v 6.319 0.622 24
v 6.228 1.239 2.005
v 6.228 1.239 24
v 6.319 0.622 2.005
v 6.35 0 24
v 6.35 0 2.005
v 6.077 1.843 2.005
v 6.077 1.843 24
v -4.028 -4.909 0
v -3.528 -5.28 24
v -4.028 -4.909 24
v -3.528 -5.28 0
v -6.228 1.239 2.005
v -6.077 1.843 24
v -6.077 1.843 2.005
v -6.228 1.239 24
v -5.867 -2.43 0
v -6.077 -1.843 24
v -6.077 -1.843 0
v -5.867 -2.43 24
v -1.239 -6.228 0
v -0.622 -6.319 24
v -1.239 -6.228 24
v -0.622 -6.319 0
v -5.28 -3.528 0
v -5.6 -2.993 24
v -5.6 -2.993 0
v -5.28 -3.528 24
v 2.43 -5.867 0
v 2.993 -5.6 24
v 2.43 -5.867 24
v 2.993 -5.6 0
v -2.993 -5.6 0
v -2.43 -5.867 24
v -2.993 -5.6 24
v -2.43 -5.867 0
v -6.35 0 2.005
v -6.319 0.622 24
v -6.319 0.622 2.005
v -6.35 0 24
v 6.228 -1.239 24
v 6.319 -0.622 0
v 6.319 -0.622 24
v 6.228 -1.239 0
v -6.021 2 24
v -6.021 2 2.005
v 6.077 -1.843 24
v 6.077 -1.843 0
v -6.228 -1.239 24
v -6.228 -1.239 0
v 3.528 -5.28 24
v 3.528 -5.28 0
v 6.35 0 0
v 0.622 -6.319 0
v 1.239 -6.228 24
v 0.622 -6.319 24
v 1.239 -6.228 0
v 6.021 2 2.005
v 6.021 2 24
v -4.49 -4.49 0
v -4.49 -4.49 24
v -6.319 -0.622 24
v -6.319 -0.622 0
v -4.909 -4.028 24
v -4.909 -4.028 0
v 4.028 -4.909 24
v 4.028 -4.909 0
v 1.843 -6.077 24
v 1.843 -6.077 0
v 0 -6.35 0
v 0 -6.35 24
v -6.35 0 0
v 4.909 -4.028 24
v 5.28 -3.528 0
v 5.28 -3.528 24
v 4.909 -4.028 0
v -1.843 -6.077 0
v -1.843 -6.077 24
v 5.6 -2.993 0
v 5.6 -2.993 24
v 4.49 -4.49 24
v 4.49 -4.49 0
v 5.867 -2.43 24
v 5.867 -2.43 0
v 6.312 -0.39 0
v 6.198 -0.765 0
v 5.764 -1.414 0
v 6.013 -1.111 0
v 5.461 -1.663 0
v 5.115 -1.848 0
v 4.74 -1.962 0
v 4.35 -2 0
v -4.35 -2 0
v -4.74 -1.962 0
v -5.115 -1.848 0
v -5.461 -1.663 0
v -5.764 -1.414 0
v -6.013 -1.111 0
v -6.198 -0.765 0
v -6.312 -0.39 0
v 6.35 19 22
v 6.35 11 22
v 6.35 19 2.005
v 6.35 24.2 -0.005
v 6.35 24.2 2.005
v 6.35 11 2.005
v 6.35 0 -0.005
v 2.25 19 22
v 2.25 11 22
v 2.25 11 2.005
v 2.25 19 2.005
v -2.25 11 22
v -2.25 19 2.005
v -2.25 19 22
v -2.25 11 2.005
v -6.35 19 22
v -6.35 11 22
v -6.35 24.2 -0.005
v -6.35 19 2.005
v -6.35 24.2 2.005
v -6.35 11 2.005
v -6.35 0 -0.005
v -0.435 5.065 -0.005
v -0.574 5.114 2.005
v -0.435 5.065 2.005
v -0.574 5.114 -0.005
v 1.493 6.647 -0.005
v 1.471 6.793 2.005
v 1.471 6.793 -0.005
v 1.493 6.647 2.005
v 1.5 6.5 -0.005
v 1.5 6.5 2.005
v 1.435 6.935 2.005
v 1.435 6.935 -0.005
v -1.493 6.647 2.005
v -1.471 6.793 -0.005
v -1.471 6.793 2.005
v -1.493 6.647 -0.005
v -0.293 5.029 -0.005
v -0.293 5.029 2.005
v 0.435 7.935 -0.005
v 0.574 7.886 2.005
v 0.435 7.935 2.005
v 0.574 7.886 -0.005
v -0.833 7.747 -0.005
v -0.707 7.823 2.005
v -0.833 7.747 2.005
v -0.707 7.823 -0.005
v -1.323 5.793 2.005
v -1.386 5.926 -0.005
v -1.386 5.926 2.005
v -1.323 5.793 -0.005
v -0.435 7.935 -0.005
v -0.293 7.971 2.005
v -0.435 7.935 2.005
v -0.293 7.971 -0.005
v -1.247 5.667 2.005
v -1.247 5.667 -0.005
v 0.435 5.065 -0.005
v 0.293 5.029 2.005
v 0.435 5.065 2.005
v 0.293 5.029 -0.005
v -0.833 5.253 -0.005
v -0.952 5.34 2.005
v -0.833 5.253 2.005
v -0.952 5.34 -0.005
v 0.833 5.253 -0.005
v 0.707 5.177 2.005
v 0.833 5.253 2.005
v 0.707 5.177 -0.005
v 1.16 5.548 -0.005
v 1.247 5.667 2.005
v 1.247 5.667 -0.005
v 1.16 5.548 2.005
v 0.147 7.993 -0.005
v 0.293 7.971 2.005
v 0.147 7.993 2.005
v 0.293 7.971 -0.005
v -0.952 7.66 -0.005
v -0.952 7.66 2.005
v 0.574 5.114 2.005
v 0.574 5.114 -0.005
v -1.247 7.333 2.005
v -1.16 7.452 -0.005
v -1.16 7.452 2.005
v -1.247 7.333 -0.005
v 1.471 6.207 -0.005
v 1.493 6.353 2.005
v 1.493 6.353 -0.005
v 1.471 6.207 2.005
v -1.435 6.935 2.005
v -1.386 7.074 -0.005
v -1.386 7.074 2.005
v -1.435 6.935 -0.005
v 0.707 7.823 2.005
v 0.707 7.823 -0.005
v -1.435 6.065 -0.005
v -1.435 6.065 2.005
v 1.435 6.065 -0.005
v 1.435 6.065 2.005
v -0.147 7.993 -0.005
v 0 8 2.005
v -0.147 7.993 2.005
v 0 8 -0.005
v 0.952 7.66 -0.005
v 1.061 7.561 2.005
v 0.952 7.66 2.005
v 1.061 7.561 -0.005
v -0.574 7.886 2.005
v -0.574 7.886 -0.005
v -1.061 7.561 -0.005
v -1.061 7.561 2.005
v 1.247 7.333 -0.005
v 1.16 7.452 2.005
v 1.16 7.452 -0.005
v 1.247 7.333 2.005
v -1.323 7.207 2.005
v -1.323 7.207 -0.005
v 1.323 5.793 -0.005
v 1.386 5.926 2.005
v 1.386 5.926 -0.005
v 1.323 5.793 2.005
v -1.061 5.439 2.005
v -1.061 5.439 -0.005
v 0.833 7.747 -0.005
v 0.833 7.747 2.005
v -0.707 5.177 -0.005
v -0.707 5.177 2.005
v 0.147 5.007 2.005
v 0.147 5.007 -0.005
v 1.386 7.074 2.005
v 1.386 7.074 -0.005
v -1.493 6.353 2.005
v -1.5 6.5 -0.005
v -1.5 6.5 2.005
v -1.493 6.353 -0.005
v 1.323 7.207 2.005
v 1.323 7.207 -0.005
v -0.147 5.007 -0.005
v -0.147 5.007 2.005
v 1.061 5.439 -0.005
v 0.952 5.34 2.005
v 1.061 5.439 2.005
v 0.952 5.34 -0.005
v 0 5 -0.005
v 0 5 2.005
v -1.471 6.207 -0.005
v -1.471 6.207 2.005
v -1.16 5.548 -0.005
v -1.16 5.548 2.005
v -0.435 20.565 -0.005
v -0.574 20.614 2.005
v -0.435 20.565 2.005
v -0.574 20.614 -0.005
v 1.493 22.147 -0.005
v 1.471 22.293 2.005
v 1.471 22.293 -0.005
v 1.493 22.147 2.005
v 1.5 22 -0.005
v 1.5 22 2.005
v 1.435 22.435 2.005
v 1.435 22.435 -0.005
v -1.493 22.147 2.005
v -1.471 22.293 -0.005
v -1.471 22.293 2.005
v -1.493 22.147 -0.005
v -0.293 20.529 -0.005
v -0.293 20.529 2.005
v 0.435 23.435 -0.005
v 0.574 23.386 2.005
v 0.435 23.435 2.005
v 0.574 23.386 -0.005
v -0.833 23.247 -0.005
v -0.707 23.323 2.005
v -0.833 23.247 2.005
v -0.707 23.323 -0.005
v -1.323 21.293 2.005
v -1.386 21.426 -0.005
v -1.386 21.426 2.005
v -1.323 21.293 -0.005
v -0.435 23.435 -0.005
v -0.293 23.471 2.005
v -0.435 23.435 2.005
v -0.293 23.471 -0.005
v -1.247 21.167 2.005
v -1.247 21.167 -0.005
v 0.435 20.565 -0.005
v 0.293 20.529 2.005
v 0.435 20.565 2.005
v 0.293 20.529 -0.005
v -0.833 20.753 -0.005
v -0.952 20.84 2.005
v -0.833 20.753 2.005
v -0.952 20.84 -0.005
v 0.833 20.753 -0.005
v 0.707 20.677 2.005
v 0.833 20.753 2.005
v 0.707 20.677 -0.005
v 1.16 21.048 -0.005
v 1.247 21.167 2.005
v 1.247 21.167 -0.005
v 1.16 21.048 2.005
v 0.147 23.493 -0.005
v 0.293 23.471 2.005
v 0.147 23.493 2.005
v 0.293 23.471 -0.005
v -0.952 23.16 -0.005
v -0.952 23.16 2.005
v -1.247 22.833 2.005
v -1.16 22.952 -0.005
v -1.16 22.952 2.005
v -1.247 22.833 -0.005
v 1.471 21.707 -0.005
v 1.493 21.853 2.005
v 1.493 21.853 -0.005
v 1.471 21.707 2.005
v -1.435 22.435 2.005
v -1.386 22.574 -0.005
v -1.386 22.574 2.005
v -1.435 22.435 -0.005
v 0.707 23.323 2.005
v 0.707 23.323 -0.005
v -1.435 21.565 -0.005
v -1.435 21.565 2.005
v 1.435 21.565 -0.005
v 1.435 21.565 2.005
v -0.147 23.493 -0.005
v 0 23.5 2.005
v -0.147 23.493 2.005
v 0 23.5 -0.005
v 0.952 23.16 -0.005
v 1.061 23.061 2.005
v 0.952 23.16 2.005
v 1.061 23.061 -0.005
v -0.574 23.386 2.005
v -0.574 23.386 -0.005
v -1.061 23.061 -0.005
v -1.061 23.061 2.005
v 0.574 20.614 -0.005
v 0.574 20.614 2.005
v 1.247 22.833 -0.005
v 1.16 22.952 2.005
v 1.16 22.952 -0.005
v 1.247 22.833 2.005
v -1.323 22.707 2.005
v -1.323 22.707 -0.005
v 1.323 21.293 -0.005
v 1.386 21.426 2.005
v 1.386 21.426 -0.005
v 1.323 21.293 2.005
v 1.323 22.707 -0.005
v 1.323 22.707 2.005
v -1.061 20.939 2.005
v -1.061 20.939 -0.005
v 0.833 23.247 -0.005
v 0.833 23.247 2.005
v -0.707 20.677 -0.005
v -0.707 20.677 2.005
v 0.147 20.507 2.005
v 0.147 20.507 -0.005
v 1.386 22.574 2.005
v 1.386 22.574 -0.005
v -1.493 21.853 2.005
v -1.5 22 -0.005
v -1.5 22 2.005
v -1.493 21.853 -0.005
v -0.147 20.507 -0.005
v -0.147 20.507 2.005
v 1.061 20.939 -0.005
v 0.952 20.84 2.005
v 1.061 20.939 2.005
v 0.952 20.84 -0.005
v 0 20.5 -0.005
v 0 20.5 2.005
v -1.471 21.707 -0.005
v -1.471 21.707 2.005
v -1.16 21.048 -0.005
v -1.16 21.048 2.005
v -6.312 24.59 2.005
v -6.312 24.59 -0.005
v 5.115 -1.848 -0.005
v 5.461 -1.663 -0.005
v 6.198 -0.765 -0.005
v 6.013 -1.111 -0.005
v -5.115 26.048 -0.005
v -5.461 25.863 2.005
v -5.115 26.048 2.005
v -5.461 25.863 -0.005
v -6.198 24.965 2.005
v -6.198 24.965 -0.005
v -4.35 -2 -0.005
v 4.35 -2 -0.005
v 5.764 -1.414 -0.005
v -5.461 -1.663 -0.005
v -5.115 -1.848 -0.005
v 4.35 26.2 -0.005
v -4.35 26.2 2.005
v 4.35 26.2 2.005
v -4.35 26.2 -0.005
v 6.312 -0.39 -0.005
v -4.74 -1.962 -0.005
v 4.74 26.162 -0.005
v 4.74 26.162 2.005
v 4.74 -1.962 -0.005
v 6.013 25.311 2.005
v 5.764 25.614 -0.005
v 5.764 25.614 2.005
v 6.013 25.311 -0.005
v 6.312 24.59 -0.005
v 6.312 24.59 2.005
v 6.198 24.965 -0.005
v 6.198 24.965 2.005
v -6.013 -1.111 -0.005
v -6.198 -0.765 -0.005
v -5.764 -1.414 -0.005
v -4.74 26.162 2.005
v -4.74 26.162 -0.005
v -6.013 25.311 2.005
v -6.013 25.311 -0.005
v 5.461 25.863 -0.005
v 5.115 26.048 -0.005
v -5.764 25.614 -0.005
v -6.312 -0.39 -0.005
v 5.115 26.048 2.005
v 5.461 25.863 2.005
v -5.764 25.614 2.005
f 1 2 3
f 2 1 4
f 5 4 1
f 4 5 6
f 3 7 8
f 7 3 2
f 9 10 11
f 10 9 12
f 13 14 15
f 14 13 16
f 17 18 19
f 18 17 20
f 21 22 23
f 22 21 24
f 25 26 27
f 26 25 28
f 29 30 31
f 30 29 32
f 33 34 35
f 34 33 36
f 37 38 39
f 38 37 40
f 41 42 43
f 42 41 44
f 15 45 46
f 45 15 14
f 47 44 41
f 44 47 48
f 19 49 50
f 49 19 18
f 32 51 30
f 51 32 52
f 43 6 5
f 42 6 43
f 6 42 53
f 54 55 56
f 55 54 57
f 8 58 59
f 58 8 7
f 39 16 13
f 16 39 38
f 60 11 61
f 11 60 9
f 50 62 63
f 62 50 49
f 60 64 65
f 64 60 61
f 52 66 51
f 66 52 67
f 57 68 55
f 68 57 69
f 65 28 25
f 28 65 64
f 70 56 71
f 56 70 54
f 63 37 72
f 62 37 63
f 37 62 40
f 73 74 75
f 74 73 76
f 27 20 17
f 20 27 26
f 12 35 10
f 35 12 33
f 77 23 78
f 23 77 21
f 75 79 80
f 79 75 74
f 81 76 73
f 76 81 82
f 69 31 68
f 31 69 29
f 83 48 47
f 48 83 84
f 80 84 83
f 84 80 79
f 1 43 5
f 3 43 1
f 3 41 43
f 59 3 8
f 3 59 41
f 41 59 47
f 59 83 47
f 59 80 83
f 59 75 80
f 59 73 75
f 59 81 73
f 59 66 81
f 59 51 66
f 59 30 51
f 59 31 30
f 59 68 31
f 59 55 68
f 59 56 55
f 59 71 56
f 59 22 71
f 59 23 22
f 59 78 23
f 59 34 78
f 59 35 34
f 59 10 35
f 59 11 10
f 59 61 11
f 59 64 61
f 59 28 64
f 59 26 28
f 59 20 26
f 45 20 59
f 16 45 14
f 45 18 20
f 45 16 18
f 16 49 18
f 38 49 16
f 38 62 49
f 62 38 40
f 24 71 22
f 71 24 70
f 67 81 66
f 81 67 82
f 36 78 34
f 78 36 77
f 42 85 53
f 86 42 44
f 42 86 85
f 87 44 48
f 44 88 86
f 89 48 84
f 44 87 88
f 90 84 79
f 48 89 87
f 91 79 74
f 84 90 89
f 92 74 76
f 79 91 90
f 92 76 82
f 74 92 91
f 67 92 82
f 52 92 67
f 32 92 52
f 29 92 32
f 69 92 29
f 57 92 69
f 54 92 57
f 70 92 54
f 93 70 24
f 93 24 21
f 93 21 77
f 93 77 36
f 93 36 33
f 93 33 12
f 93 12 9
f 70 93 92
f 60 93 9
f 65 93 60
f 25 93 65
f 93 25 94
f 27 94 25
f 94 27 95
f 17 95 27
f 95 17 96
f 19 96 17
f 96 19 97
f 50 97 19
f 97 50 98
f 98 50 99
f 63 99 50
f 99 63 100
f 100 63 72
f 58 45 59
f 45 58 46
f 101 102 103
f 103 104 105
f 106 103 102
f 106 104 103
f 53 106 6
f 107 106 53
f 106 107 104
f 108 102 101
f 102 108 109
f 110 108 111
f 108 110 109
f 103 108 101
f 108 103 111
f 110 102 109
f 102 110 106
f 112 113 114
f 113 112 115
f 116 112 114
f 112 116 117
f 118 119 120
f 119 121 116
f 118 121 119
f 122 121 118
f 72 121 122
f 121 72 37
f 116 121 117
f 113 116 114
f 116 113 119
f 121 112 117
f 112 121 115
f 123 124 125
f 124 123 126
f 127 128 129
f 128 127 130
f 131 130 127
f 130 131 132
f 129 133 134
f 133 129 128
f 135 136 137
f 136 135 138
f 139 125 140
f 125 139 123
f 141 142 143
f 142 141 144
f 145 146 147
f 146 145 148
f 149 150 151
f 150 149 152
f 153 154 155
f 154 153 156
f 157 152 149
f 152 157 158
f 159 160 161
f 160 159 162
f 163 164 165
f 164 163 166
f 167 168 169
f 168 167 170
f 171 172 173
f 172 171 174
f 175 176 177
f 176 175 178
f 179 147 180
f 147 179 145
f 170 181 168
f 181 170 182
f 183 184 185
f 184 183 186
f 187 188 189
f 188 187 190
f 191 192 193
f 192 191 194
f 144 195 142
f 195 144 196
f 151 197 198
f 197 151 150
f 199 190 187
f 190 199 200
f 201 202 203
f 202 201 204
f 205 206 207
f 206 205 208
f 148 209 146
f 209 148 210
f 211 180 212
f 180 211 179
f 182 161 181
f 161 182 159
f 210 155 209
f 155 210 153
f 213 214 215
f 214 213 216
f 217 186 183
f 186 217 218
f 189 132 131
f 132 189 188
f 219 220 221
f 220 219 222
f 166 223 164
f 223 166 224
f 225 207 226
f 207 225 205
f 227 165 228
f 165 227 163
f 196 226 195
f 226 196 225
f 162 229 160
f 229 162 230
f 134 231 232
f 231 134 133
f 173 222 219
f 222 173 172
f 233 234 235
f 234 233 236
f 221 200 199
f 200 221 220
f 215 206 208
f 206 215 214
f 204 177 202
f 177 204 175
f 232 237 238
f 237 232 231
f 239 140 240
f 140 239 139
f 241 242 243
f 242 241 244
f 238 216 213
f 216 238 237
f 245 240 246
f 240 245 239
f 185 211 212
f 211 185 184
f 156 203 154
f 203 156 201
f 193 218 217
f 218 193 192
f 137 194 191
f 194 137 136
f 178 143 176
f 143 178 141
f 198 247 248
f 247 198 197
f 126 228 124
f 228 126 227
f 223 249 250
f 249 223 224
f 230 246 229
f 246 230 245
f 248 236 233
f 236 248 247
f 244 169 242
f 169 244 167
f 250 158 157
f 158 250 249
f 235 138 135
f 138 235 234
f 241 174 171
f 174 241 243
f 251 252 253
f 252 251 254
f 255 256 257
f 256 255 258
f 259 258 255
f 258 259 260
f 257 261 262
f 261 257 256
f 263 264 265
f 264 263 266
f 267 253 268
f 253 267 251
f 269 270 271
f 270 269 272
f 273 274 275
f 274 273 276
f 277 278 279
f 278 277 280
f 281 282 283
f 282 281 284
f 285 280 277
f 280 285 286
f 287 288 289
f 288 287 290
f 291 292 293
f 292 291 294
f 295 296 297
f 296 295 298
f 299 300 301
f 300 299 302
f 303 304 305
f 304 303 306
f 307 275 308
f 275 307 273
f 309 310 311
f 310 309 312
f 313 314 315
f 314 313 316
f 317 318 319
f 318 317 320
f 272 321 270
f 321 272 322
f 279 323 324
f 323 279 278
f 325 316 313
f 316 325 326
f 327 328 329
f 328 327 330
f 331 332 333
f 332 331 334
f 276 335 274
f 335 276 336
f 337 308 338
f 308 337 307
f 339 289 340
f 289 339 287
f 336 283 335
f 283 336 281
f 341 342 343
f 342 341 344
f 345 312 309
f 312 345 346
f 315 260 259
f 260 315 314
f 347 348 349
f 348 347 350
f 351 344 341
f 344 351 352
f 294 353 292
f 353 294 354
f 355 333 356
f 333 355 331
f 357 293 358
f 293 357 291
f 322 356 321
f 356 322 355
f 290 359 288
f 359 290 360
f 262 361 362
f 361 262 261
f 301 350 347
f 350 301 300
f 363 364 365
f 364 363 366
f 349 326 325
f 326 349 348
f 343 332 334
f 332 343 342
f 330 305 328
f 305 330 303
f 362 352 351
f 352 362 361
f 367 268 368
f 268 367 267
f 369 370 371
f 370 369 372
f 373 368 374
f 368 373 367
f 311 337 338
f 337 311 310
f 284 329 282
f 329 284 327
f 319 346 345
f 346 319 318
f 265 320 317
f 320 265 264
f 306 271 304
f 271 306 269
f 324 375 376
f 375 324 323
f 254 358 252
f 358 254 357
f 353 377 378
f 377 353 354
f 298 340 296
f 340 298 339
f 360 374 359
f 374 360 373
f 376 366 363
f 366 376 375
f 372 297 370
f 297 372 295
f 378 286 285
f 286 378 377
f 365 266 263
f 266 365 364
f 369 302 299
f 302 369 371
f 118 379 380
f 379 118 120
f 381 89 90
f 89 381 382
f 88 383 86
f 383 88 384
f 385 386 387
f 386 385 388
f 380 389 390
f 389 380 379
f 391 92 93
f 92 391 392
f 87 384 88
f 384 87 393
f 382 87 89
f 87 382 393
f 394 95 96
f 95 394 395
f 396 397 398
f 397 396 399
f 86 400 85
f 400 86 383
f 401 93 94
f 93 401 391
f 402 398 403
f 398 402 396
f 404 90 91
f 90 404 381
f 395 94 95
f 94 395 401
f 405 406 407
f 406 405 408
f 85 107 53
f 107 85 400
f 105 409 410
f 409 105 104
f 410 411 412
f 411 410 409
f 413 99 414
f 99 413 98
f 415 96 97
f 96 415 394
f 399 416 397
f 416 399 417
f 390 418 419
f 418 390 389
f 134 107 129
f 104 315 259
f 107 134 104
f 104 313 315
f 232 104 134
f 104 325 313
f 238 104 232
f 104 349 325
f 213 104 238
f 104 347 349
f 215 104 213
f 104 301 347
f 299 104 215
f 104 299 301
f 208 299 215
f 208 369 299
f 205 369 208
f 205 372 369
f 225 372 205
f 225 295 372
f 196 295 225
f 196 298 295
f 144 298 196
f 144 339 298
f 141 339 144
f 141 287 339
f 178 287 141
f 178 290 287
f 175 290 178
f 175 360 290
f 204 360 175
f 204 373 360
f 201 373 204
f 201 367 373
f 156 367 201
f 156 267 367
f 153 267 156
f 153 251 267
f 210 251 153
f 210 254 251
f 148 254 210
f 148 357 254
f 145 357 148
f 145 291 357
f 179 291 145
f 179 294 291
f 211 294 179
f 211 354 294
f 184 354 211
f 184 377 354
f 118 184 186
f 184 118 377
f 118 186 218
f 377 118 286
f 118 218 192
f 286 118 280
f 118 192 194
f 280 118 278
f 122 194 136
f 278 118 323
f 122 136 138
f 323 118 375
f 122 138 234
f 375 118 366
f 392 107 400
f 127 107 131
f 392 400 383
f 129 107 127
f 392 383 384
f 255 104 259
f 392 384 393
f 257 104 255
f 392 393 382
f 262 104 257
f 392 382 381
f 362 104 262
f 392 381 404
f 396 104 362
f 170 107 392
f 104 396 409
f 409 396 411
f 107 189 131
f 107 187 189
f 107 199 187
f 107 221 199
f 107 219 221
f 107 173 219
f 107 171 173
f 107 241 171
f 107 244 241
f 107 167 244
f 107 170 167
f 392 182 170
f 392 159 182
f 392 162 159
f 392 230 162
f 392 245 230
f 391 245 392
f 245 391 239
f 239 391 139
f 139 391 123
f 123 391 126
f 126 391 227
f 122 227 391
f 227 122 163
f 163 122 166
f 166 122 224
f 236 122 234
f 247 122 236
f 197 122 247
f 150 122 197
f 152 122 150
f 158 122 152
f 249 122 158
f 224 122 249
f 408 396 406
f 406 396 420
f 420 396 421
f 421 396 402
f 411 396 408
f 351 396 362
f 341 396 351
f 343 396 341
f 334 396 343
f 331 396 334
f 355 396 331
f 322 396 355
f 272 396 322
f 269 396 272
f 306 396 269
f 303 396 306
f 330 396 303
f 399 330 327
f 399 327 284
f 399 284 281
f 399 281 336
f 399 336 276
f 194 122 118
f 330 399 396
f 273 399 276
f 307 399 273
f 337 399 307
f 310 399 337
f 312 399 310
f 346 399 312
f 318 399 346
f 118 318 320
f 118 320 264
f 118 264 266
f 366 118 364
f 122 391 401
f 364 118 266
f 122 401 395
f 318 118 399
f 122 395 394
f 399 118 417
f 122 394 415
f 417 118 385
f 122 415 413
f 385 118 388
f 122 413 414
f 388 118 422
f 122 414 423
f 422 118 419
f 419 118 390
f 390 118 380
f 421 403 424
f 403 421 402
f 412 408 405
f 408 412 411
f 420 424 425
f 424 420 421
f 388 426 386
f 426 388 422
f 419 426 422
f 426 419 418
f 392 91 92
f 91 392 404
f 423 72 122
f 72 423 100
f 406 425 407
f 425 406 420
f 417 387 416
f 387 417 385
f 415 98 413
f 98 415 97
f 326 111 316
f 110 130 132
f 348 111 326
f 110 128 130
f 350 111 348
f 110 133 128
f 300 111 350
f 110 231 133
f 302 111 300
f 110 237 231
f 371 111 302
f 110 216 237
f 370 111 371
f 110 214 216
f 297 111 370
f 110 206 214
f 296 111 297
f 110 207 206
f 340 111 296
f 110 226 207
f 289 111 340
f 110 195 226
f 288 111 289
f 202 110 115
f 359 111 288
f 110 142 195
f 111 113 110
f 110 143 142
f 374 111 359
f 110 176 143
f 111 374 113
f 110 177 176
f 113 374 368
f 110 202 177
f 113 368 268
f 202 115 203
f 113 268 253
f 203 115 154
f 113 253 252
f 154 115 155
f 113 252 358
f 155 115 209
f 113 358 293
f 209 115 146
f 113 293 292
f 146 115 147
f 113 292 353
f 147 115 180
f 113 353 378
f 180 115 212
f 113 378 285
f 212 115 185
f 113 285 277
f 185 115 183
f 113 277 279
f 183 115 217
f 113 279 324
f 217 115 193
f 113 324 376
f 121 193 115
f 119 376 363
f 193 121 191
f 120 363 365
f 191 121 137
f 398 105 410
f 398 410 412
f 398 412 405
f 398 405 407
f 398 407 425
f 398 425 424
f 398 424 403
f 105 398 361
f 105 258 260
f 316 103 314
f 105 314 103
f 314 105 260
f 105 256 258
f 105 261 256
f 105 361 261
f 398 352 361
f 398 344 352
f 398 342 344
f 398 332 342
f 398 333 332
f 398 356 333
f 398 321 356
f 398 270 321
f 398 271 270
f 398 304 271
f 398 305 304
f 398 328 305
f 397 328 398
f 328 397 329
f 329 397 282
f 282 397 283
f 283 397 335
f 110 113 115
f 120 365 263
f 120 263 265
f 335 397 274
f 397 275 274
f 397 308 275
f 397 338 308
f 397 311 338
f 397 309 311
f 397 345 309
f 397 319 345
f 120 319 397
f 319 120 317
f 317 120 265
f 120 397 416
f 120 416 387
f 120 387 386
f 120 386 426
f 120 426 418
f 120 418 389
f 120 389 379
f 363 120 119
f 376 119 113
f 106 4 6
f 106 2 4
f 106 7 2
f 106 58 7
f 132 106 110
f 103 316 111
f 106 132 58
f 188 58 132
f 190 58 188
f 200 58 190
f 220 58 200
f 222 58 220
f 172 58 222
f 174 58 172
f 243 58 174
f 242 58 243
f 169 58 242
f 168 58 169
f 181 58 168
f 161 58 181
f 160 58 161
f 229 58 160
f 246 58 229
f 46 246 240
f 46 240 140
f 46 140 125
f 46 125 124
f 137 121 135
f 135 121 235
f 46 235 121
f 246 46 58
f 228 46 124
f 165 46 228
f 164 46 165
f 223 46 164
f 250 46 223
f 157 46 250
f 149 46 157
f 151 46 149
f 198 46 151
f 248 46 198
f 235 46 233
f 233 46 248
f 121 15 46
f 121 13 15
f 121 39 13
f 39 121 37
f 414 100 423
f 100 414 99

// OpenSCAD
// file: shared/cleaning_wipe_holder.scad
// Module: Basic cleaning wipe holder
// Repo: https://github.com/hornc/VHS-cleaning
// Author: hornc, 2026
// Version: v0.1
// License: CC BY-SA 4.0

cleaning_wipe_holder();

module cleaning_wipe_holder( ) {
    $fn = 64;
    base = 2;
    post = 22;
    tape = 12.7;
    gap = 4.5;
    postdepth = 8;

    // Main post
    difference(){
        cylinder(post + base, d=tape);
        translate([tape / -2, 2, -1])
            cube([tape + 5, tape, post + 5]);
    }
    // grip posts
    translate([2.25, 2 + 9, 0])
        cube([(tape - gap) / 2, postdepth, post]);
    translate([1.85 -tape + gap, 2 + 9, 0])
        cube([(tape - gap) / 2, postdepth, post]);
}
// main file
// VHS tape cleaning PEC pad holder
// prototyping a basic holder
// Repo: https://github.com/hornc/VHS-cleaning
// Author: hornc, 2026
// Version: v0.2
// License: CC BY-SA 4.0

use <shared/cleaning_wipe_holder.scad>

$fn = 64;
base = 2;
post = 22;
tape = 12.7;

cleaning_wipe_holder();

// base
difference(){
    minkowski(){ // rounded base
        translate([(tape - 4) / -2, 0, 0])
            cube([tape-4, post * 1.1, base]);
        cylinder(r=2, h=0.01, center=true, $fn=32);
    }
    group(){  // screw holes
        translate([0, 6.5, -1])
            cylinder(base * 2, d=3);
        translate([0, 22, -1])
            cylinder(base * 2, d=3);
    }
}
